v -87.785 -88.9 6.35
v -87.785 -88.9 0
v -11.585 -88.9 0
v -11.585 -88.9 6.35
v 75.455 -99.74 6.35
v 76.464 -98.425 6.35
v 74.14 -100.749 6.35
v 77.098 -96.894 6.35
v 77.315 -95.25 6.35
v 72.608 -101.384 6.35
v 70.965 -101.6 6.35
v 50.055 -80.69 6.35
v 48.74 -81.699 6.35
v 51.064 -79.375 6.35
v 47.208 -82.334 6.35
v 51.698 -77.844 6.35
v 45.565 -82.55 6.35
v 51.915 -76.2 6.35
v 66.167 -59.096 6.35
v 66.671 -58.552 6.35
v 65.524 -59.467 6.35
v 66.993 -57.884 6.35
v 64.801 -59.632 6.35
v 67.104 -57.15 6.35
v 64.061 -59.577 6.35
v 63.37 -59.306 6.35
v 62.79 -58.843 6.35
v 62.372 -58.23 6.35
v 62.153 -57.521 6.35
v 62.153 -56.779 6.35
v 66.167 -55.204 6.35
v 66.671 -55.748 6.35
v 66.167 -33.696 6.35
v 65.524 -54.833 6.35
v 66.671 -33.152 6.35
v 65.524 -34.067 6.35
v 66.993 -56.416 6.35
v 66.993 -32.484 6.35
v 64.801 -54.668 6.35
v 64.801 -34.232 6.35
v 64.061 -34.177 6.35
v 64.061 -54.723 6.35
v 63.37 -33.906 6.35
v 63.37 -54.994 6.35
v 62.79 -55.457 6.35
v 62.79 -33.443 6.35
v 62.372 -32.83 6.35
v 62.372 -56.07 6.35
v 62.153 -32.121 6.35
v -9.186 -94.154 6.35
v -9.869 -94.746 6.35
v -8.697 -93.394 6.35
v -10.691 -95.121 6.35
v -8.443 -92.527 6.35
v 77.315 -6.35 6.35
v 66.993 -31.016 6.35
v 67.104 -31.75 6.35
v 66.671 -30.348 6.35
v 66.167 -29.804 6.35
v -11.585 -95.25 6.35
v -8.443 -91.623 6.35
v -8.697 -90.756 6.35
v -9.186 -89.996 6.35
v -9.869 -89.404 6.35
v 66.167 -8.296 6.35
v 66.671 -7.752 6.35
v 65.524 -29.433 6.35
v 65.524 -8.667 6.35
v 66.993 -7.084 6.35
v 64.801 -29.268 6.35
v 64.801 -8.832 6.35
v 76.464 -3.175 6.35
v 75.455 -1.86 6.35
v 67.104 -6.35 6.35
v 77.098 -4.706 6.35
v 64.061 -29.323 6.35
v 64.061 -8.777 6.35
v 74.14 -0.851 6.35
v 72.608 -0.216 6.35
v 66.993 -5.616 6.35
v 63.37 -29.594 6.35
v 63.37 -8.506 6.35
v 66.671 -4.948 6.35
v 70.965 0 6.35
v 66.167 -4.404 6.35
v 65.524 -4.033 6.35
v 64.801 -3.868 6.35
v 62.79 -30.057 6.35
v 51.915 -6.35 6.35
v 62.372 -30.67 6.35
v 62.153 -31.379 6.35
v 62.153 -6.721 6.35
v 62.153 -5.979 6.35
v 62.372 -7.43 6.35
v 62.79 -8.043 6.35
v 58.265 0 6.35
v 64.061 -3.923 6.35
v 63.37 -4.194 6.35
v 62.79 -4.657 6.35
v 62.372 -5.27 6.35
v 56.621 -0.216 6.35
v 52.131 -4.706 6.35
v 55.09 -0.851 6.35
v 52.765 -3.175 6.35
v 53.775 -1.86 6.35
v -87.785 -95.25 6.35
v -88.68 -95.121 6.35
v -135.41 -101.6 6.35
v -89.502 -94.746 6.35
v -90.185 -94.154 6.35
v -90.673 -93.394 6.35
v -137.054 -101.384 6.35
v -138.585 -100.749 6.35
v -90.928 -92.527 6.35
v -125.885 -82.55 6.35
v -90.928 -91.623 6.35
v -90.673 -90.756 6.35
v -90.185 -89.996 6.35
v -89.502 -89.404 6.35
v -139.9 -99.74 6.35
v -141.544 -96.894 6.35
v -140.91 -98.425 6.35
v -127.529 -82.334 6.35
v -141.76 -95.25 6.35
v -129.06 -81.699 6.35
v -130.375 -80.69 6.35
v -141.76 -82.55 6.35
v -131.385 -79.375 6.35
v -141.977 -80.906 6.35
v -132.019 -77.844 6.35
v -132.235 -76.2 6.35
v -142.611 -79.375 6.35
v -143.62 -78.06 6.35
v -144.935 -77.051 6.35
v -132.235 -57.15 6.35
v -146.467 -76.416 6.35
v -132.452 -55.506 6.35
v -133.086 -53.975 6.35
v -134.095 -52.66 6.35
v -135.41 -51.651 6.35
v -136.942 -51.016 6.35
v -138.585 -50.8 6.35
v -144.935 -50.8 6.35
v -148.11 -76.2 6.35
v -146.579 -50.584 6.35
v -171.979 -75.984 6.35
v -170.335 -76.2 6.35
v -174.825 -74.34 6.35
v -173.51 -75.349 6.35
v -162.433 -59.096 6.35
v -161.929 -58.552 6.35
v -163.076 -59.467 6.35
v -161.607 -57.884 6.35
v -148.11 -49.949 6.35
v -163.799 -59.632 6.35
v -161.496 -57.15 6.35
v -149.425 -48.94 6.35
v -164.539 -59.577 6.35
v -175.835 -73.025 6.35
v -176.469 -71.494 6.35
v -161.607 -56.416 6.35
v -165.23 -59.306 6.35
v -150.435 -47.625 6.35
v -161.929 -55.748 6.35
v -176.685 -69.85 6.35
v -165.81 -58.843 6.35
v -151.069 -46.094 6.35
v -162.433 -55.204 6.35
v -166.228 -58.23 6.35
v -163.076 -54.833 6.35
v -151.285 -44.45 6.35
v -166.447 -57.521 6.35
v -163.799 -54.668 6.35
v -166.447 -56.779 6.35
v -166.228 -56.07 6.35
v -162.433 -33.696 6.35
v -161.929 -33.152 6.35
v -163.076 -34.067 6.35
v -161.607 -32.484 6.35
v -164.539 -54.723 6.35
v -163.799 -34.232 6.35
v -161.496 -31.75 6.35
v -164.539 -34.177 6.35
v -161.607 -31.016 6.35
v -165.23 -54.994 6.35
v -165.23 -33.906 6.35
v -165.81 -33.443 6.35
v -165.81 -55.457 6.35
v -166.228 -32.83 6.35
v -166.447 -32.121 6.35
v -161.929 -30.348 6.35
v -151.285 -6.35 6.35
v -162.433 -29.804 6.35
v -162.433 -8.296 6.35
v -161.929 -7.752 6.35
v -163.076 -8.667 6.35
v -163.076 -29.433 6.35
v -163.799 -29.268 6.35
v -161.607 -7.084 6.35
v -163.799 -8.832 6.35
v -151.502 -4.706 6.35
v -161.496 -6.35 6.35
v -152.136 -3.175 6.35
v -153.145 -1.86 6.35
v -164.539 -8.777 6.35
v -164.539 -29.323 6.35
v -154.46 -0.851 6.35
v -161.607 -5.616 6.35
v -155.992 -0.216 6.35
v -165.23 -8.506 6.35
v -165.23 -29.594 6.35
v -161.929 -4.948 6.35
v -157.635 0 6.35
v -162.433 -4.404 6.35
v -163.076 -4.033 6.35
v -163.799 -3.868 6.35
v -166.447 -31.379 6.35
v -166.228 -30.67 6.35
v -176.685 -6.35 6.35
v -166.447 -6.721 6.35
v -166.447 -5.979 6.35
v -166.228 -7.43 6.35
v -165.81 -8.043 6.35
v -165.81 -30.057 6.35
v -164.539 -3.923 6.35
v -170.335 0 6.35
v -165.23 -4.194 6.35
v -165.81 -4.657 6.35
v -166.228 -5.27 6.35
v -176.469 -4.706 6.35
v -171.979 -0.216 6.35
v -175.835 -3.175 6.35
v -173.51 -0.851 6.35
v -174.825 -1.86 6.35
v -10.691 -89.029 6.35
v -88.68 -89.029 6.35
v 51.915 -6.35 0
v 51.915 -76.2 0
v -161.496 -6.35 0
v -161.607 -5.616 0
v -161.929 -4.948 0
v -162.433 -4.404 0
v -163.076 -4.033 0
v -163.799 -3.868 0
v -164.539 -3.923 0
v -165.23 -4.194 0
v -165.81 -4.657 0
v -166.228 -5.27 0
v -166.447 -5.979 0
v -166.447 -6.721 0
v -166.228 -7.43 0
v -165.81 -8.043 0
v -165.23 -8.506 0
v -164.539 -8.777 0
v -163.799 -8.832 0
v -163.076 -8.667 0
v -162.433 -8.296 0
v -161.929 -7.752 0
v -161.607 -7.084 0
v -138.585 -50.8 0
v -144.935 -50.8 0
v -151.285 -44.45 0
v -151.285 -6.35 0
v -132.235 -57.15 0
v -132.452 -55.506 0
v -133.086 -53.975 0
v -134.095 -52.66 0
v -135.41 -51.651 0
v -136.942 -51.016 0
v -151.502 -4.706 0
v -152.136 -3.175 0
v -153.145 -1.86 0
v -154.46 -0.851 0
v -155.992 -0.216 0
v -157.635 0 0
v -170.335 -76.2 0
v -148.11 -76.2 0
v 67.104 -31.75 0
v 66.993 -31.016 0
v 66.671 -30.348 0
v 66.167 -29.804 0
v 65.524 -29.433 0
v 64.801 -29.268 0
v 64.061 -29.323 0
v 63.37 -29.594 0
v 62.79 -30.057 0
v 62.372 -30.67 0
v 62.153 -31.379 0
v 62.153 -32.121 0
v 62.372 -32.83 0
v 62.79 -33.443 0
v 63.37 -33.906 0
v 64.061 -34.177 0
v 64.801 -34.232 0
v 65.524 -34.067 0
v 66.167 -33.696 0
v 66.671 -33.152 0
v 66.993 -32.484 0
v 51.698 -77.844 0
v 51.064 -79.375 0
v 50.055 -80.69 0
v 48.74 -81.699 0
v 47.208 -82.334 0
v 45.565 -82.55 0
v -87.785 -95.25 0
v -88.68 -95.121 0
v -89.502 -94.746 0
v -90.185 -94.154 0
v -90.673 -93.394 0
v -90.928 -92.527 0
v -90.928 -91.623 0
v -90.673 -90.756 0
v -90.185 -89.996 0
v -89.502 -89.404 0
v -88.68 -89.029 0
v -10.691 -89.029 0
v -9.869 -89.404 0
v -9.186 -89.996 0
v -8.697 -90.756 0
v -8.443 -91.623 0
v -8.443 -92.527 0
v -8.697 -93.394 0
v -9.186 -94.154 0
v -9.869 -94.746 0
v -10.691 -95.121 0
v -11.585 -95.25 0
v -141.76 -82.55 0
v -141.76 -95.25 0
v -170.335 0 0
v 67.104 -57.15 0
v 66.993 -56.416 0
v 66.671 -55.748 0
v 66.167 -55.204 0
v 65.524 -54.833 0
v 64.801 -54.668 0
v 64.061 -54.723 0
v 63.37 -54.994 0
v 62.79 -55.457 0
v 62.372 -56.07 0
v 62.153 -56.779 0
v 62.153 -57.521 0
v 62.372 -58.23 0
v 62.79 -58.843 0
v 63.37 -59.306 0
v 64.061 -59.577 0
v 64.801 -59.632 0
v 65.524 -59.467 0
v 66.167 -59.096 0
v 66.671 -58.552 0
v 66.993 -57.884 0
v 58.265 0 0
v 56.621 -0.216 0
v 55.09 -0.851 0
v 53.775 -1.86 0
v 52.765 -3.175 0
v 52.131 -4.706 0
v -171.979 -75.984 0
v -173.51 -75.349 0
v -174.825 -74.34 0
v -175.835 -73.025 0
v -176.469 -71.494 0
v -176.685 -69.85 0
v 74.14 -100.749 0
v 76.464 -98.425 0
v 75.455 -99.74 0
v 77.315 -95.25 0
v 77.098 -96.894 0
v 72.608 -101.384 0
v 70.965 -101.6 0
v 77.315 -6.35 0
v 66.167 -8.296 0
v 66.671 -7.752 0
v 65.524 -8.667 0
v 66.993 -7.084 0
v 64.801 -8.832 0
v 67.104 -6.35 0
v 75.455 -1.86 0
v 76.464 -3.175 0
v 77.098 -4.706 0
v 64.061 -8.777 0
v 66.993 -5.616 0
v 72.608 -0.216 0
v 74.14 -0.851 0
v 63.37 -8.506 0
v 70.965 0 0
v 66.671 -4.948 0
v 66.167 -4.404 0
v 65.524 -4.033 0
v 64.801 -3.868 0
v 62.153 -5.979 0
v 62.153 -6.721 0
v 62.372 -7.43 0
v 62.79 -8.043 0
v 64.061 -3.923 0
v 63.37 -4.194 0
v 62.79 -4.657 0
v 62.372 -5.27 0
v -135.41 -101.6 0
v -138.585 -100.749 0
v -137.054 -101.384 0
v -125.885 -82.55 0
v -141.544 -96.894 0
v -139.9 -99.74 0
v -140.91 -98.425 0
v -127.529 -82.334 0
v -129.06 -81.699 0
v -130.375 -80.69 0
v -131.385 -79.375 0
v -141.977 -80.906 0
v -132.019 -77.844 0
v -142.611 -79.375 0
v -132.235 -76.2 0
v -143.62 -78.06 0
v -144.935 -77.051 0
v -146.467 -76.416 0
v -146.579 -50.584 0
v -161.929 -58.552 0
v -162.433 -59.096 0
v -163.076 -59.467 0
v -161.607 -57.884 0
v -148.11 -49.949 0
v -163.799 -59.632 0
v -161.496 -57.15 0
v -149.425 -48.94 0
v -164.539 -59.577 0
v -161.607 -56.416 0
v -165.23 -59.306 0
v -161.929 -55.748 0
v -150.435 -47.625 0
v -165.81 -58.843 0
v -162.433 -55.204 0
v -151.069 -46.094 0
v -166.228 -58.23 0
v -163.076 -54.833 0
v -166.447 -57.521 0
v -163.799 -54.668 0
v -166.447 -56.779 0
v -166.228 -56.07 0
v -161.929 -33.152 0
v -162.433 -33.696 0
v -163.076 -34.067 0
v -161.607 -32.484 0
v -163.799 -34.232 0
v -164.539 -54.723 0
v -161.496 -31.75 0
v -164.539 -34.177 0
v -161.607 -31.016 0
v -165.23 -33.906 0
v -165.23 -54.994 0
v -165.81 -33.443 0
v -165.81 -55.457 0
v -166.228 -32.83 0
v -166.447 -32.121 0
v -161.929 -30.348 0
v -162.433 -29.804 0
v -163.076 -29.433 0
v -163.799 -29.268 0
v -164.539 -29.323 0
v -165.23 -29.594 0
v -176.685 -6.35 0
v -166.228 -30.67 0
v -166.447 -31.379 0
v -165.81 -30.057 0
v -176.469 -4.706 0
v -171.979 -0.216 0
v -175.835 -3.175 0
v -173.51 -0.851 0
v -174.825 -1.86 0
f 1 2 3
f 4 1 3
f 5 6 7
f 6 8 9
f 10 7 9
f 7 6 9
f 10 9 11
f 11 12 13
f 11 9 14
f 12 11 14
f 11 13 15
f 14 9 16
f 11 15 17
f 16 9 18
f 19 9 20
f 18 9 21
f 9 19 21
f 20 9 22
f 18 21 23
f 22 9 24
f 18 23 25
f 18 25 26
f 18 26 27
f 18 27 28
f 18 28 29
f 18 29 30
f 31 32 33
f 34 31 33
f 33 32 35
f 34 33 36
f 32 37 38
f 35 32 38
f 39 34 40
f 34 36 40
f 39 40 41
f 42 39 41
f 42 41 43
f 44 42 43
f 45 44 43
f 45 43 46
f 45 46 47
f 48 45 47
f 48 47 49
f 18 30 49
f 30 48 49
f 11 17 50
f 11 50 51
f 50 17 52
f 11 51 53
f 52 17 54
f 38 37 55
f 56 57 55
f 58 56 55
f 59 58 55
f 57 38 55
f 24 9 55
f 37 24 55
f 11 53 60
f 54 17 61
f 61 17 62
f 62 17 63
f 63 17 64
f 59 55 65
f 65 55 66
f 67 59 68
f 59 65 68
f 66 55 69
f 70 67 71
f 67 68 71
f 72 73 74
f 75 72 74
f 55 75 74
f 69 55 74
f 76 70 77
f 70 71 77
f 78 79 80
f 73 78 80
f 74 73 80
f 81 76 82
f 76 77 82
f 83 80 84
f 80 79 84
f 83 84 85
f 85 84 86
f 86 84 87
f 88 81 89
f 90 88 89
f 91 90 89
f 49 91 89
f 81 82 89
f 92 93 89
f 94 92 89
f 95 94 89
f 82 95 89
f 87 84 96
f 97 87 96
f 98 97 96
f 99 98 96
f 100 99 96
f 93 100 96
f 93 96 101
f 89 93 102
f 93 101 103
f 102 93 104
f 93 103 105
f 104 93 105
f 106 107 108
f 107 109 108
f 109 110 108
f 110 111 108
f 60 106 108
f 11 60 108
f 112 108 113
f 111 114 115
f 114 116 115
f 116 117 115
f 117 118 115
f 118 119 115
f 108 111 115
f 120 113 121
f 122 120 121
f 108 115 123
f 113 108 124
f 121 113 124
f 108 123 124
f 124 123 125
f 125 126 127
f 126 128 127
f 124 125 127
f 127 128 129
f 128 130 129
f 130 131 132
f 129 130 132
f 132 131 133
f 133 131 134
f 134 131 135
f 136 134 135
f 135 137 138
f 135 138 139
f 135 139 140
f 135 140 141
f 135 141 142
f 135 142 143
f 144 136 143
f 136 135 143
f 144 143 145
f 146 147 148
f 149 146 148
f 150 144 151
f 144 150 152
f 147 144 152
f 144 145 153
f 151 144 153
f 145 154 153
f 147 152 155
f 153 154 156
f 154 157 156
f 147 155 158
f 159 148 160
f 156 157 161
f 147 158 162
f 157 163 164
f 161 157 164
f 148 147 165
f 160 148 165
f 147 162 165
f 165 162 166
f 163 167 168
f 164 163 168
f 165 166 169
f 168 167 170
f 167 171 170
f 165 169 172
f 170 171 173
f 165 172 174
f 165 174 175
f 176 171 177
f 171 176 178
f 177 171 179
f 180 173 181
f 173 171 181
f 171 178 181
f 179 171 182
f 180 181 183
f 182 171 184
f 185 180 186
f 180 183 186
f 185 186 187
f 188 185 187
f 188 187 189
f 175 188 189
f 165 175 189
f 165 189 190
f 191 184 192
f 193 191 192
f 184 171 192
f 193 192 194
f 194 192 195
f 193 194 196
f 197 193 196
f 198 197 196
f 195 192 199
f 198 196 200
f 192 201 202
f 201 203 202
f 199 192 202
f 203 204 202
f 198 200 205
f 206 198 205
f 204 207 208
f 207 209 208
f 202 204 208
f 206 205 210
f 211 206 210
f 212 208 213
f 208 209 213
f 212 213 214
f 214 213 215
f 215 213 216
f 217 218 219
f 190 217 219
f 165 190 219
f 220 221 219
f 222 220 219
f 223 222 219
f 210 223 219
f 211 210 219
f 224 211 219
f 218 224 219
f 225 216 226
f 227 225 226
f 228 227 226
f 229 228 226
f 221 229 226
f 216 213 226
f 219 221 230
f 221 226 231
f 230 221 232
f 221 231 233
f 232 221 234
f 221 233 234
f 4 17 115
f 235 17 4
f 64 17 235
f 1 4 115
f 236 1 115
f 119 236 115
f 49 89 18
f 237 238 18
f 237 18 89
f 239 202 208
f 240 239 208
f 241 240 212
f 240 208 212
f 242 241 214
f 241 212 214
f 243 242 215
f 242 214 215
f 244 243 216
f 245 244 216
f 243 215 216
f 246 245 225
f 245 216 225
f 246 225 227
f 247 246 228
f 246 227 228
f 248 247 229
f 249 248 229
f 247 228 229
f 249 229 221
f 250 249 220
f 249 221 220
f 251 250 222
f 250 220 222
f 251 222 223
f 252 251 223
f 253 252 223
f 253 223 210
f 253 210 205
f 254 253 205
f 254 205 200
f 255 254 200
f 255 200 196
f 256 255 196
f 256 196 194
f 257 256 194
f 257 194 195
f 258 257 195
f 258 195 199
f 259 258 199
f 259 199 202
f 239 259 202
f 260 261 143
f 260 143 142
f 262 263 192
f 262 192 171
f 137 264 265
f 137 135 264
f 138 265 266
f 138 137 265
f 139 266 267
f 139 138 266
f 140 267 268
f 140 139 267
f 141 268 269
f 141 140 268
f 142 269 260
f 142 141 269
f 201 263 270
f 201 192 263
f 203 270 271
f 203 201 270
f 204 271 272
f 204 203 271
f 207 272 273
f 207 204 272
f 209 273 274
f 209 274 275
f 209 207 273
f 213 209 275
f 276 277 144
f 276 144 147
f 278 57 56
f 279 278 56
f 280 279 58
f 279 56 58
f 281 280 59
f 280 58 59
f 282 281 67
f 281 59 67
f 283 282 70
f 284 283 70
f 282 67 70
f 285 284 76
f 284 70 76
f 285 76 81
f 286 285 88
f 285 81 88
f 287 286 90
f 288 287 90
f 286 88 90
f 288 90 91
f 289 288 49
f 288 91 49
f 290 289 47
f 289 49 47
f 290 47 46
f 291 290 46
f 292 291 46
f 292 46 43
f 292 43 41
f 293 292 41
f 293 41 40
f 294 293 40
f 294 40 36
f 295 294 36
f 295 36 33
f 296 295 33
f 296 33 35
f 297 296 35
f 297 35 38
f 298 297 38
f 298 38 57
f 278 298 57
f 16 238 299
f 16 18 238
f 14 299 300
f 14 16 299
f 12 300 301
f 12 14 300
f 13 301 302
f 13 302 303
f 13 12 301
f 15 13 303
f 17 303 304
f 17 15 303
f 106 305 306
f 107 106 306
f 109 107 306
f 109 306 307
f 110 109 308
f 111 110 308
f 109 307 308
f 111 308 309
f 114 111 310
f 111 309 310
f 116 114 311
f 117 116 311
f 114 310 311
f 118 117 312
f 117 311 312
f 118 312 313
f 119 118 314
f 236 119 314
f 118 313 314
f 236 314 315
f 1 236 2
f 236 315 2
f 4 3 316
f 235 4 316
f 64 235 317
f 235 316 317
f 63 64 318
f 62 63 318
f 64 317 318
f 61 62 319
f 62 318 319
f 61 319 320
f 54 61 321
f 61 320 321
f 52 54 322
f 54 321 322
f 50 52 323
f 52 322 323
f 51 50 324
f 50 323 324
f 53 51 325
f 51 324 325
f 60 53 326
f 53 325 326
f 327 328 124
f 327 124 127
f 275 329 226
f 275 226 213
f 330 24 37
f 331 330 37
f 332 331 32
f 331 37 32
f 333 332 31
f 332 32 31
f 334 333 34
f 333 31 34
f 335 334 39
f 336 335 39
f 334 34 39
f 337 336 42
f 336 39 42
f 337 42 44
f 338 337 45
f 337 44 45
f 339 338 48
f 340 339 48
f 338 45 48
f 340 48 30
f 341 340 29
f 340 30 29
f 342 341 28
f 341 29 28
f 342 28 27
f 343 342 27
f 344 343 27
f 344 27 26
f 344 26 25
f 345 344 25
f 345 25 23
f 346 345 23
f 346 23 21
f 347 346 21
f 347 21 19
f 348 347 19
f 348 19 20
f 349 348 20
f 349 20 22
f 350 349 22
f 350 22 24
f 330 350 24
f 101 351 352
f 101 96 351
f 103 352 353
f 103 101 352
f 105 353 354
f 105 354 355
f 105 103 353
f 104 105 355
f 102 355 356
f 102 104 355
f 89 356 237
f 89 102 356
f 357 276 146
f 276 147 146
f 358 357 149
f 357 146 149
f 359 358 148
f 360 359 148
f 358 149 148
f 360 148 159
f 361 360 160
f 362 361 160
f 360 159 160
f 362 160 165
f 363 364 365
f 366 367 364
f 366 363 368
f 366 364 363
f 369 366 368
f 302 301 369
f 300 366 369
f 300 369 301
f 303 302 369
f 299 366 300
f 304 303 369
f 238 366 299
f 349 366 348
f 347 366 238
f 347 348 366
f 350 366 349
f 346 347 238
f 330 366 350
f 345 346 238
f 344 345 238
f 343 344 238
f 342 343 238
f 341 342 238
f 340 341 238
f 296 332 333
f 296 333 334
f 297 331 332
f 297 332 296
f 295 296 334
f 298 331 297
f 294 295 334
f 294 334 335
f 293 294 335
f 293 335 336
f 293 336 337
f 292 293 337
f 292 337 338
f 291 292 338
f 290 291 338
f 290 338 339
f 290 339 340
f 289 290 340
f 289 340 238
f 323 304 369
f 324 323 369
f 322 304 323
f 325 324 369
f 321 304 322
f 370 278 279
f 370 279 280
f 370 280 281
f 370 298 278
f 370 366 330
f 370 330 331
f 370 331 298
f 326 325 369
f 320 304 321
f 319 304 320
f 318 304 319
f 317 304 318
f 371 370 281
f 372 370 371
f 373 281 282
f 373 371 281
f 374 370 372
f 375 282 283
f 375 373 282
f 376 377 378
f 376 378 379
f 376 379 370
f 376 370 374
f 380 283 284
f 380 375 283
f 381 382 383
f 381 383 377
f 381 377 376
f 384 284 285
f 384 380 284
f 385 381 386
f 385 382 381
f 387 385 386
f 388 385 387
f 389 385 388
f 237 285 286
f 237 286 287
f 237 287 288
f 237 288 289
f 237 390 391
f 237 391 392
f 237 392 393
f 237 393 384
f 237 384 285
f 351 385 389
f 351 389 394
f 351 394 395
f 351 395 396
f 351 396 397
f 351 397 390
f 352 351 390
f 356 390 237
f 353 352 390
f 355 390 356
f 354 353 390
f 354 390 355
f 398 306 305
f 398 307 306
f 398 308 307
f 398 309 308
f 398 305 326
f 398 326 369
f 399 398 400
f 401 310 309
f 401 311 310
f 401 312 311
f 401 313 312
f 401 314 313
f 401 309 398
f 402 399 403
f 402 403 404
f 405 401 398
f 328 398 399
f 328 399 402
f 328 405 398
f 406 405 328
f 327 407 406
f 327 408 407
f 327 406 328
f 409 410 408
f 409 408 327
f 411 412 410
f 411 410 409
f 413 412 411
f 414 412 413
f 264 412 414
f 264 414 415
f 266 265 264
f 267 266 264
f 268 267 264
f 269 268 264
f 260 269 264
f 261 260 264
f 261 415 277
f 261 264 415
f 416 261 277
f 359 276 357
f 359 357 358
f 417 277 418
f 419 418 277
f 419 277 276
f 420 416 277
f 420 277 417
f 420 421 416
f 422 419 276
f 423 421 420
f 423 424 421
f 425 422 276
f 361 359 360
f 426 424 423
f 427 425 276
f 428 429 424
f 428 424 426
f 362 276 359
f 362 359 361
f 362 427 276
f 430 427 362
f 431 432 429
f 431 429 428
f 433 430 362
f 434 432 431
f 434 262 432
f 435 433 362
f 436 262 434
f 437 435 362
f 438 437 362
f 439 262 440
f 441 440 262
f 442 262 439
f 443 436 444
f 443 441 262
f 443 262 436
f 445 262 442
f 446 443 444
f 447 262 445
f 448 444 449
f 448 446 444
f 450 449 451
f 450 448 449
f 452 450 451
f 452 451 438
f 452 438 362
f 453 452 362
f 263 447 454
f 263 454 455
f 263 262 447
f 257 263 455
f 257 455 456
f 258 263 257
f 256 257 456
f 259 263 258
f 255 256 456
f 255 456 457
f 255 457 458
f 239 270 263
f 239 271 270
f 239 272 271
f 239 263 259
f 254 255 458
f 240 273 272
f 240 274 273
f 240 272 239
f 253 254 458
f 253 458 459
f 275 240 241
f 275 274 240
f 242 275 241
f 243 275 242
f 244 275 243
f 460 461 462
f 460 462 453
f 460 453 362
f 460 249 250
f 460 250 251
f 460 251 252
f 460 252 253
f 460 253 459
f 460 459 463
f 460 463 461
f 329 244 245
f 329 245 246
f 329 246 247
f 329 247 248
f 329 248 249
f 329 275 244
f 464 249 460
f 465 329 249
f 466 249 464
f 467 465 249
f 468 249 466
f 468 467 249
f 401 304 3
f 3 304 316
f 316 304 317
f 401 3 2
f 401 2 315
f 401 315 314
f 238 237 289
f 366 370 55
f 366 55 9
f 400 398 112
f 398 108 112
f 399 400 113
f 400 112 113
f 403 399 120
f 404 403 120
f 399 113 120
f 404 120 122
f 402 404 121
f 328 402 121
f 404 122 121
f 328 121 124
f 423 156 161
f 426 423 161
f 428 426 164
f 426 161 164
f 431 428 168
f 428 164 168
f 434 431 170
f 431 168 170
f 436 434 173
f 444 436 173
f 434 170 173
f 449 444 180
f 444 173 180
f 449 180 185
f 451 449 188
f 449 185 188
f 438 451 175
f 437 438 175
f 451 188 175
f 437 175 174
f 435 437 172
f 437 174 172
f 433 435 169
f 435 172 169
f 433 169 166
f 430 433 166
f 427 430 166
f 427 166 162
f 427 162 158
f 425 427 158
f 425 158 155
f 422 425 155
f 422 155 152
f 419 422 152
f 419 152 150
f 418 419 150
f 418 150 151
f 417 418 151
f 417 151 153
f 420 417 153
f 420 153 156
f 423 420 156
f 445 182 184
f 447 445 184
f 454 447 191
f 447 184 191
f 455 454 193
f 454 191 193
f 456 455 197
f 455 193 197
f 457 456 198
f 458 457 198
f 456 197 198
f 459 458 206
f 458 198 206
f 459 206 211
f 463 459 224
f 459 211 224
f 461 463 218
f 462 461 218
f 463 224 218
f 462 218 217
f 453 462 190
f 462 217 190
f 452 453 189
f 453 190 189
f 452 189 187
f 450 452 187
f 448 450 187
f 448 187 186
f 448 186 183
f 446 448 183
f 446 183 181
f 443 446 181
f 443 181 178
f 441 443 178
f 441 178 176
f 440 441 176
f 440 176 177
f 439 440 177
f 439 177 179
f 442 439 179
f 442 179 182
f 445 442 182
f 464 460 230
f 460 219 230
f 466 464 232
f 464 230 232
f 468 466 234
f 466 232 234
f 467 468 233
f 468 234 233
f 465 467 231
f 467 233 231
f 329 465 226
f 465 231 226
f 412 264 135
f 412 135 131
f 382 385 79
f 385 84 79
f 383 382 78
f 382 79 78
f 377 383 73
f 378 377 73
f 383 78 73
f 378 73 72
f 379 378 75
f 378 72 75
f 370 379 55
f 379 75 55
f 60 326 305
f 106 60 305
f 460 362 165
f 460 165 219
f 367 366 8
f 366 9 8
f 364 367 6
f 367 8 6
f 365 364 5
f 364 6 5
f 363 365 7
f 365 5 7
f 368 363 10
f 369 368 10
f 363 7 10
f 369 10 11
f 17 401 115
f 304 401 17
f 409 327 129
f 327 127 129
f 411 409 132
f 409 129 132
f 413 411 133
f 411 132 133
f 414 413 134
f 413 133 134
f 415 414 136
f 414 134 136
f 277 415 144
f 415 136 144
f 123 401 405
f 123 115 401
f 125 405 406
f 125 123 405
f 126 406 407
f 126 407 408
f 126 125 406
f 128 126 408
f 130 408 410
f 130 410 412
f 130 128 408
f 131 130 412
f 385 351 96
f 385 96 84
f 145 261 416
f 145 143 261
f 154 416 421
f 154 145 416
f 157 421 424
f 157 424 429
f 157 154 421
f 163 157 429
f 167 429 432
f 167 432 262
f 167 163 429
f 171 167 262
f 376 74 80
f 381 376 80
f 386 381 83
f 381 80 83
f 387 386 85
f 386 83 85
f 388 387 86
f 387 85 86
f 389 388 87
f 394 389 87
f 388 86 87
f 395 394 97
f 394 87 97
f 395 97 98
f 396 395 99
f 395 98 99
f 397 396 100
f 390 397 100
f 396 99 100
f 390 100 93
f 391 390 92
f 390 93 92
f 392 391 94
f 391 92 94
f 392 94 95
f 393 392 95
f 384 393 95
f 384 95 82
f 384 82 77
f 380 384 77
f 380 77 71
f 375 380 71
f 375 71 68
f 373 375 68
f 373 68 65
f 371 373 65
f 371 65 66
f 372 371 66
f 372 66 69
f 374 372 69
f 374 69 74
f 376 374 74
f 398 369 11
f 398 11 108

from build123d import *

# Parameters (mm, degrees)
BOSS_EXTRUDE2_DEPTH = 6.35
FILLET1_R           = 6.35
SKETCH2_R           = 2.4892
CUT_EXTRUDE1_DEPTH  = 204.913109234


with BuildPart() as part:
    # Sketch1 → Boss-Extrude2 (new body)
    with BuildSketch(Plane.XY):
        Polygon((51.914761179, 0), (77.314761179, 0), (77.314761179, -101.6), (-141.760238821, -101.6), (-141.760238821, -76.2), (-176.685238821, -76.2), (-176.685238821, 0), (-151.285238821, 0), (-151.285238821, -50.8), (-132.235238821, -50.8), (-132.235238821, -82.55), (51.914761179, -82.55), align=None)
        with BuildLine():
            Line((-87.785238821, -88.9), (-11.585238821, -88.9))
            ThreePointArc((-11.585238821, -88.9), (-8.410238821, -92.075), (-11.585238821, -95.25))
            Line((-11.585238821, -95.25), (-87.785238821, -95.25))
            ThreePointArc((-87.785238821, -95.25), (-90.960238821, -92.075), (-87.785238821, -88.9))
        make_face(mode=Mode.SUBTRACT)
    extrude(amount=BOSS_EXTRUDE2_DEPTH)

    # Fillet1
    fillet1_edges = [part.edges().sort_by_distance(p)[0] for p in [
        (-176.685238821, 0, 3.175),
        (-151.285238821, 0, 3.175),
        (-151.285238821, -50.8, 3.175),
        (-132.235238821, -50.8, 3.175),
        (-132.235238821, -82.55, 3.175),
        (51.914761179, -82.55, 3.175),
        (51.914761179, 0, 3.175),
        (77.314761179, 0, 3.175),
        (77.314761179, -101.6, 3.175),
        (-141.760238821, -101.6, 3.175),
        (-141.760238821, -76.2, 3.175),
        (-176.685238821, -76.2, 3.175),
    ]]
    fillet(fillet1_edges, radius=FILLET1_R)

    # Sketch2 → Cut-Extrude1 (cut, through all)
    with BuildSketch(Plane.XY.offset(6.35)):
        with Locations((64.614761179, -6.35)):
            Circle(SKETCH2_R)
        with Locations((64.614761179, -31.75)):
            Circle(SKETCH2_R)
        with Locations((64.614761179, -57.15)):
            Circle(SKETCH2_R)
        with Locations((-163.985238821, -6.35)):
            Circle(SKETCH2_R)
        with Locations((-163.985238821, -31.75)):
            Circle(SKETCH2_R)
        with Locations((-163.985238821, -57.15)):
            Circle(SKETCH2_R)
    extrude(amount=-CUT_EXTRUDE1_DEPTH, mode=Mode.SUBTRACT)


solid = part.part
